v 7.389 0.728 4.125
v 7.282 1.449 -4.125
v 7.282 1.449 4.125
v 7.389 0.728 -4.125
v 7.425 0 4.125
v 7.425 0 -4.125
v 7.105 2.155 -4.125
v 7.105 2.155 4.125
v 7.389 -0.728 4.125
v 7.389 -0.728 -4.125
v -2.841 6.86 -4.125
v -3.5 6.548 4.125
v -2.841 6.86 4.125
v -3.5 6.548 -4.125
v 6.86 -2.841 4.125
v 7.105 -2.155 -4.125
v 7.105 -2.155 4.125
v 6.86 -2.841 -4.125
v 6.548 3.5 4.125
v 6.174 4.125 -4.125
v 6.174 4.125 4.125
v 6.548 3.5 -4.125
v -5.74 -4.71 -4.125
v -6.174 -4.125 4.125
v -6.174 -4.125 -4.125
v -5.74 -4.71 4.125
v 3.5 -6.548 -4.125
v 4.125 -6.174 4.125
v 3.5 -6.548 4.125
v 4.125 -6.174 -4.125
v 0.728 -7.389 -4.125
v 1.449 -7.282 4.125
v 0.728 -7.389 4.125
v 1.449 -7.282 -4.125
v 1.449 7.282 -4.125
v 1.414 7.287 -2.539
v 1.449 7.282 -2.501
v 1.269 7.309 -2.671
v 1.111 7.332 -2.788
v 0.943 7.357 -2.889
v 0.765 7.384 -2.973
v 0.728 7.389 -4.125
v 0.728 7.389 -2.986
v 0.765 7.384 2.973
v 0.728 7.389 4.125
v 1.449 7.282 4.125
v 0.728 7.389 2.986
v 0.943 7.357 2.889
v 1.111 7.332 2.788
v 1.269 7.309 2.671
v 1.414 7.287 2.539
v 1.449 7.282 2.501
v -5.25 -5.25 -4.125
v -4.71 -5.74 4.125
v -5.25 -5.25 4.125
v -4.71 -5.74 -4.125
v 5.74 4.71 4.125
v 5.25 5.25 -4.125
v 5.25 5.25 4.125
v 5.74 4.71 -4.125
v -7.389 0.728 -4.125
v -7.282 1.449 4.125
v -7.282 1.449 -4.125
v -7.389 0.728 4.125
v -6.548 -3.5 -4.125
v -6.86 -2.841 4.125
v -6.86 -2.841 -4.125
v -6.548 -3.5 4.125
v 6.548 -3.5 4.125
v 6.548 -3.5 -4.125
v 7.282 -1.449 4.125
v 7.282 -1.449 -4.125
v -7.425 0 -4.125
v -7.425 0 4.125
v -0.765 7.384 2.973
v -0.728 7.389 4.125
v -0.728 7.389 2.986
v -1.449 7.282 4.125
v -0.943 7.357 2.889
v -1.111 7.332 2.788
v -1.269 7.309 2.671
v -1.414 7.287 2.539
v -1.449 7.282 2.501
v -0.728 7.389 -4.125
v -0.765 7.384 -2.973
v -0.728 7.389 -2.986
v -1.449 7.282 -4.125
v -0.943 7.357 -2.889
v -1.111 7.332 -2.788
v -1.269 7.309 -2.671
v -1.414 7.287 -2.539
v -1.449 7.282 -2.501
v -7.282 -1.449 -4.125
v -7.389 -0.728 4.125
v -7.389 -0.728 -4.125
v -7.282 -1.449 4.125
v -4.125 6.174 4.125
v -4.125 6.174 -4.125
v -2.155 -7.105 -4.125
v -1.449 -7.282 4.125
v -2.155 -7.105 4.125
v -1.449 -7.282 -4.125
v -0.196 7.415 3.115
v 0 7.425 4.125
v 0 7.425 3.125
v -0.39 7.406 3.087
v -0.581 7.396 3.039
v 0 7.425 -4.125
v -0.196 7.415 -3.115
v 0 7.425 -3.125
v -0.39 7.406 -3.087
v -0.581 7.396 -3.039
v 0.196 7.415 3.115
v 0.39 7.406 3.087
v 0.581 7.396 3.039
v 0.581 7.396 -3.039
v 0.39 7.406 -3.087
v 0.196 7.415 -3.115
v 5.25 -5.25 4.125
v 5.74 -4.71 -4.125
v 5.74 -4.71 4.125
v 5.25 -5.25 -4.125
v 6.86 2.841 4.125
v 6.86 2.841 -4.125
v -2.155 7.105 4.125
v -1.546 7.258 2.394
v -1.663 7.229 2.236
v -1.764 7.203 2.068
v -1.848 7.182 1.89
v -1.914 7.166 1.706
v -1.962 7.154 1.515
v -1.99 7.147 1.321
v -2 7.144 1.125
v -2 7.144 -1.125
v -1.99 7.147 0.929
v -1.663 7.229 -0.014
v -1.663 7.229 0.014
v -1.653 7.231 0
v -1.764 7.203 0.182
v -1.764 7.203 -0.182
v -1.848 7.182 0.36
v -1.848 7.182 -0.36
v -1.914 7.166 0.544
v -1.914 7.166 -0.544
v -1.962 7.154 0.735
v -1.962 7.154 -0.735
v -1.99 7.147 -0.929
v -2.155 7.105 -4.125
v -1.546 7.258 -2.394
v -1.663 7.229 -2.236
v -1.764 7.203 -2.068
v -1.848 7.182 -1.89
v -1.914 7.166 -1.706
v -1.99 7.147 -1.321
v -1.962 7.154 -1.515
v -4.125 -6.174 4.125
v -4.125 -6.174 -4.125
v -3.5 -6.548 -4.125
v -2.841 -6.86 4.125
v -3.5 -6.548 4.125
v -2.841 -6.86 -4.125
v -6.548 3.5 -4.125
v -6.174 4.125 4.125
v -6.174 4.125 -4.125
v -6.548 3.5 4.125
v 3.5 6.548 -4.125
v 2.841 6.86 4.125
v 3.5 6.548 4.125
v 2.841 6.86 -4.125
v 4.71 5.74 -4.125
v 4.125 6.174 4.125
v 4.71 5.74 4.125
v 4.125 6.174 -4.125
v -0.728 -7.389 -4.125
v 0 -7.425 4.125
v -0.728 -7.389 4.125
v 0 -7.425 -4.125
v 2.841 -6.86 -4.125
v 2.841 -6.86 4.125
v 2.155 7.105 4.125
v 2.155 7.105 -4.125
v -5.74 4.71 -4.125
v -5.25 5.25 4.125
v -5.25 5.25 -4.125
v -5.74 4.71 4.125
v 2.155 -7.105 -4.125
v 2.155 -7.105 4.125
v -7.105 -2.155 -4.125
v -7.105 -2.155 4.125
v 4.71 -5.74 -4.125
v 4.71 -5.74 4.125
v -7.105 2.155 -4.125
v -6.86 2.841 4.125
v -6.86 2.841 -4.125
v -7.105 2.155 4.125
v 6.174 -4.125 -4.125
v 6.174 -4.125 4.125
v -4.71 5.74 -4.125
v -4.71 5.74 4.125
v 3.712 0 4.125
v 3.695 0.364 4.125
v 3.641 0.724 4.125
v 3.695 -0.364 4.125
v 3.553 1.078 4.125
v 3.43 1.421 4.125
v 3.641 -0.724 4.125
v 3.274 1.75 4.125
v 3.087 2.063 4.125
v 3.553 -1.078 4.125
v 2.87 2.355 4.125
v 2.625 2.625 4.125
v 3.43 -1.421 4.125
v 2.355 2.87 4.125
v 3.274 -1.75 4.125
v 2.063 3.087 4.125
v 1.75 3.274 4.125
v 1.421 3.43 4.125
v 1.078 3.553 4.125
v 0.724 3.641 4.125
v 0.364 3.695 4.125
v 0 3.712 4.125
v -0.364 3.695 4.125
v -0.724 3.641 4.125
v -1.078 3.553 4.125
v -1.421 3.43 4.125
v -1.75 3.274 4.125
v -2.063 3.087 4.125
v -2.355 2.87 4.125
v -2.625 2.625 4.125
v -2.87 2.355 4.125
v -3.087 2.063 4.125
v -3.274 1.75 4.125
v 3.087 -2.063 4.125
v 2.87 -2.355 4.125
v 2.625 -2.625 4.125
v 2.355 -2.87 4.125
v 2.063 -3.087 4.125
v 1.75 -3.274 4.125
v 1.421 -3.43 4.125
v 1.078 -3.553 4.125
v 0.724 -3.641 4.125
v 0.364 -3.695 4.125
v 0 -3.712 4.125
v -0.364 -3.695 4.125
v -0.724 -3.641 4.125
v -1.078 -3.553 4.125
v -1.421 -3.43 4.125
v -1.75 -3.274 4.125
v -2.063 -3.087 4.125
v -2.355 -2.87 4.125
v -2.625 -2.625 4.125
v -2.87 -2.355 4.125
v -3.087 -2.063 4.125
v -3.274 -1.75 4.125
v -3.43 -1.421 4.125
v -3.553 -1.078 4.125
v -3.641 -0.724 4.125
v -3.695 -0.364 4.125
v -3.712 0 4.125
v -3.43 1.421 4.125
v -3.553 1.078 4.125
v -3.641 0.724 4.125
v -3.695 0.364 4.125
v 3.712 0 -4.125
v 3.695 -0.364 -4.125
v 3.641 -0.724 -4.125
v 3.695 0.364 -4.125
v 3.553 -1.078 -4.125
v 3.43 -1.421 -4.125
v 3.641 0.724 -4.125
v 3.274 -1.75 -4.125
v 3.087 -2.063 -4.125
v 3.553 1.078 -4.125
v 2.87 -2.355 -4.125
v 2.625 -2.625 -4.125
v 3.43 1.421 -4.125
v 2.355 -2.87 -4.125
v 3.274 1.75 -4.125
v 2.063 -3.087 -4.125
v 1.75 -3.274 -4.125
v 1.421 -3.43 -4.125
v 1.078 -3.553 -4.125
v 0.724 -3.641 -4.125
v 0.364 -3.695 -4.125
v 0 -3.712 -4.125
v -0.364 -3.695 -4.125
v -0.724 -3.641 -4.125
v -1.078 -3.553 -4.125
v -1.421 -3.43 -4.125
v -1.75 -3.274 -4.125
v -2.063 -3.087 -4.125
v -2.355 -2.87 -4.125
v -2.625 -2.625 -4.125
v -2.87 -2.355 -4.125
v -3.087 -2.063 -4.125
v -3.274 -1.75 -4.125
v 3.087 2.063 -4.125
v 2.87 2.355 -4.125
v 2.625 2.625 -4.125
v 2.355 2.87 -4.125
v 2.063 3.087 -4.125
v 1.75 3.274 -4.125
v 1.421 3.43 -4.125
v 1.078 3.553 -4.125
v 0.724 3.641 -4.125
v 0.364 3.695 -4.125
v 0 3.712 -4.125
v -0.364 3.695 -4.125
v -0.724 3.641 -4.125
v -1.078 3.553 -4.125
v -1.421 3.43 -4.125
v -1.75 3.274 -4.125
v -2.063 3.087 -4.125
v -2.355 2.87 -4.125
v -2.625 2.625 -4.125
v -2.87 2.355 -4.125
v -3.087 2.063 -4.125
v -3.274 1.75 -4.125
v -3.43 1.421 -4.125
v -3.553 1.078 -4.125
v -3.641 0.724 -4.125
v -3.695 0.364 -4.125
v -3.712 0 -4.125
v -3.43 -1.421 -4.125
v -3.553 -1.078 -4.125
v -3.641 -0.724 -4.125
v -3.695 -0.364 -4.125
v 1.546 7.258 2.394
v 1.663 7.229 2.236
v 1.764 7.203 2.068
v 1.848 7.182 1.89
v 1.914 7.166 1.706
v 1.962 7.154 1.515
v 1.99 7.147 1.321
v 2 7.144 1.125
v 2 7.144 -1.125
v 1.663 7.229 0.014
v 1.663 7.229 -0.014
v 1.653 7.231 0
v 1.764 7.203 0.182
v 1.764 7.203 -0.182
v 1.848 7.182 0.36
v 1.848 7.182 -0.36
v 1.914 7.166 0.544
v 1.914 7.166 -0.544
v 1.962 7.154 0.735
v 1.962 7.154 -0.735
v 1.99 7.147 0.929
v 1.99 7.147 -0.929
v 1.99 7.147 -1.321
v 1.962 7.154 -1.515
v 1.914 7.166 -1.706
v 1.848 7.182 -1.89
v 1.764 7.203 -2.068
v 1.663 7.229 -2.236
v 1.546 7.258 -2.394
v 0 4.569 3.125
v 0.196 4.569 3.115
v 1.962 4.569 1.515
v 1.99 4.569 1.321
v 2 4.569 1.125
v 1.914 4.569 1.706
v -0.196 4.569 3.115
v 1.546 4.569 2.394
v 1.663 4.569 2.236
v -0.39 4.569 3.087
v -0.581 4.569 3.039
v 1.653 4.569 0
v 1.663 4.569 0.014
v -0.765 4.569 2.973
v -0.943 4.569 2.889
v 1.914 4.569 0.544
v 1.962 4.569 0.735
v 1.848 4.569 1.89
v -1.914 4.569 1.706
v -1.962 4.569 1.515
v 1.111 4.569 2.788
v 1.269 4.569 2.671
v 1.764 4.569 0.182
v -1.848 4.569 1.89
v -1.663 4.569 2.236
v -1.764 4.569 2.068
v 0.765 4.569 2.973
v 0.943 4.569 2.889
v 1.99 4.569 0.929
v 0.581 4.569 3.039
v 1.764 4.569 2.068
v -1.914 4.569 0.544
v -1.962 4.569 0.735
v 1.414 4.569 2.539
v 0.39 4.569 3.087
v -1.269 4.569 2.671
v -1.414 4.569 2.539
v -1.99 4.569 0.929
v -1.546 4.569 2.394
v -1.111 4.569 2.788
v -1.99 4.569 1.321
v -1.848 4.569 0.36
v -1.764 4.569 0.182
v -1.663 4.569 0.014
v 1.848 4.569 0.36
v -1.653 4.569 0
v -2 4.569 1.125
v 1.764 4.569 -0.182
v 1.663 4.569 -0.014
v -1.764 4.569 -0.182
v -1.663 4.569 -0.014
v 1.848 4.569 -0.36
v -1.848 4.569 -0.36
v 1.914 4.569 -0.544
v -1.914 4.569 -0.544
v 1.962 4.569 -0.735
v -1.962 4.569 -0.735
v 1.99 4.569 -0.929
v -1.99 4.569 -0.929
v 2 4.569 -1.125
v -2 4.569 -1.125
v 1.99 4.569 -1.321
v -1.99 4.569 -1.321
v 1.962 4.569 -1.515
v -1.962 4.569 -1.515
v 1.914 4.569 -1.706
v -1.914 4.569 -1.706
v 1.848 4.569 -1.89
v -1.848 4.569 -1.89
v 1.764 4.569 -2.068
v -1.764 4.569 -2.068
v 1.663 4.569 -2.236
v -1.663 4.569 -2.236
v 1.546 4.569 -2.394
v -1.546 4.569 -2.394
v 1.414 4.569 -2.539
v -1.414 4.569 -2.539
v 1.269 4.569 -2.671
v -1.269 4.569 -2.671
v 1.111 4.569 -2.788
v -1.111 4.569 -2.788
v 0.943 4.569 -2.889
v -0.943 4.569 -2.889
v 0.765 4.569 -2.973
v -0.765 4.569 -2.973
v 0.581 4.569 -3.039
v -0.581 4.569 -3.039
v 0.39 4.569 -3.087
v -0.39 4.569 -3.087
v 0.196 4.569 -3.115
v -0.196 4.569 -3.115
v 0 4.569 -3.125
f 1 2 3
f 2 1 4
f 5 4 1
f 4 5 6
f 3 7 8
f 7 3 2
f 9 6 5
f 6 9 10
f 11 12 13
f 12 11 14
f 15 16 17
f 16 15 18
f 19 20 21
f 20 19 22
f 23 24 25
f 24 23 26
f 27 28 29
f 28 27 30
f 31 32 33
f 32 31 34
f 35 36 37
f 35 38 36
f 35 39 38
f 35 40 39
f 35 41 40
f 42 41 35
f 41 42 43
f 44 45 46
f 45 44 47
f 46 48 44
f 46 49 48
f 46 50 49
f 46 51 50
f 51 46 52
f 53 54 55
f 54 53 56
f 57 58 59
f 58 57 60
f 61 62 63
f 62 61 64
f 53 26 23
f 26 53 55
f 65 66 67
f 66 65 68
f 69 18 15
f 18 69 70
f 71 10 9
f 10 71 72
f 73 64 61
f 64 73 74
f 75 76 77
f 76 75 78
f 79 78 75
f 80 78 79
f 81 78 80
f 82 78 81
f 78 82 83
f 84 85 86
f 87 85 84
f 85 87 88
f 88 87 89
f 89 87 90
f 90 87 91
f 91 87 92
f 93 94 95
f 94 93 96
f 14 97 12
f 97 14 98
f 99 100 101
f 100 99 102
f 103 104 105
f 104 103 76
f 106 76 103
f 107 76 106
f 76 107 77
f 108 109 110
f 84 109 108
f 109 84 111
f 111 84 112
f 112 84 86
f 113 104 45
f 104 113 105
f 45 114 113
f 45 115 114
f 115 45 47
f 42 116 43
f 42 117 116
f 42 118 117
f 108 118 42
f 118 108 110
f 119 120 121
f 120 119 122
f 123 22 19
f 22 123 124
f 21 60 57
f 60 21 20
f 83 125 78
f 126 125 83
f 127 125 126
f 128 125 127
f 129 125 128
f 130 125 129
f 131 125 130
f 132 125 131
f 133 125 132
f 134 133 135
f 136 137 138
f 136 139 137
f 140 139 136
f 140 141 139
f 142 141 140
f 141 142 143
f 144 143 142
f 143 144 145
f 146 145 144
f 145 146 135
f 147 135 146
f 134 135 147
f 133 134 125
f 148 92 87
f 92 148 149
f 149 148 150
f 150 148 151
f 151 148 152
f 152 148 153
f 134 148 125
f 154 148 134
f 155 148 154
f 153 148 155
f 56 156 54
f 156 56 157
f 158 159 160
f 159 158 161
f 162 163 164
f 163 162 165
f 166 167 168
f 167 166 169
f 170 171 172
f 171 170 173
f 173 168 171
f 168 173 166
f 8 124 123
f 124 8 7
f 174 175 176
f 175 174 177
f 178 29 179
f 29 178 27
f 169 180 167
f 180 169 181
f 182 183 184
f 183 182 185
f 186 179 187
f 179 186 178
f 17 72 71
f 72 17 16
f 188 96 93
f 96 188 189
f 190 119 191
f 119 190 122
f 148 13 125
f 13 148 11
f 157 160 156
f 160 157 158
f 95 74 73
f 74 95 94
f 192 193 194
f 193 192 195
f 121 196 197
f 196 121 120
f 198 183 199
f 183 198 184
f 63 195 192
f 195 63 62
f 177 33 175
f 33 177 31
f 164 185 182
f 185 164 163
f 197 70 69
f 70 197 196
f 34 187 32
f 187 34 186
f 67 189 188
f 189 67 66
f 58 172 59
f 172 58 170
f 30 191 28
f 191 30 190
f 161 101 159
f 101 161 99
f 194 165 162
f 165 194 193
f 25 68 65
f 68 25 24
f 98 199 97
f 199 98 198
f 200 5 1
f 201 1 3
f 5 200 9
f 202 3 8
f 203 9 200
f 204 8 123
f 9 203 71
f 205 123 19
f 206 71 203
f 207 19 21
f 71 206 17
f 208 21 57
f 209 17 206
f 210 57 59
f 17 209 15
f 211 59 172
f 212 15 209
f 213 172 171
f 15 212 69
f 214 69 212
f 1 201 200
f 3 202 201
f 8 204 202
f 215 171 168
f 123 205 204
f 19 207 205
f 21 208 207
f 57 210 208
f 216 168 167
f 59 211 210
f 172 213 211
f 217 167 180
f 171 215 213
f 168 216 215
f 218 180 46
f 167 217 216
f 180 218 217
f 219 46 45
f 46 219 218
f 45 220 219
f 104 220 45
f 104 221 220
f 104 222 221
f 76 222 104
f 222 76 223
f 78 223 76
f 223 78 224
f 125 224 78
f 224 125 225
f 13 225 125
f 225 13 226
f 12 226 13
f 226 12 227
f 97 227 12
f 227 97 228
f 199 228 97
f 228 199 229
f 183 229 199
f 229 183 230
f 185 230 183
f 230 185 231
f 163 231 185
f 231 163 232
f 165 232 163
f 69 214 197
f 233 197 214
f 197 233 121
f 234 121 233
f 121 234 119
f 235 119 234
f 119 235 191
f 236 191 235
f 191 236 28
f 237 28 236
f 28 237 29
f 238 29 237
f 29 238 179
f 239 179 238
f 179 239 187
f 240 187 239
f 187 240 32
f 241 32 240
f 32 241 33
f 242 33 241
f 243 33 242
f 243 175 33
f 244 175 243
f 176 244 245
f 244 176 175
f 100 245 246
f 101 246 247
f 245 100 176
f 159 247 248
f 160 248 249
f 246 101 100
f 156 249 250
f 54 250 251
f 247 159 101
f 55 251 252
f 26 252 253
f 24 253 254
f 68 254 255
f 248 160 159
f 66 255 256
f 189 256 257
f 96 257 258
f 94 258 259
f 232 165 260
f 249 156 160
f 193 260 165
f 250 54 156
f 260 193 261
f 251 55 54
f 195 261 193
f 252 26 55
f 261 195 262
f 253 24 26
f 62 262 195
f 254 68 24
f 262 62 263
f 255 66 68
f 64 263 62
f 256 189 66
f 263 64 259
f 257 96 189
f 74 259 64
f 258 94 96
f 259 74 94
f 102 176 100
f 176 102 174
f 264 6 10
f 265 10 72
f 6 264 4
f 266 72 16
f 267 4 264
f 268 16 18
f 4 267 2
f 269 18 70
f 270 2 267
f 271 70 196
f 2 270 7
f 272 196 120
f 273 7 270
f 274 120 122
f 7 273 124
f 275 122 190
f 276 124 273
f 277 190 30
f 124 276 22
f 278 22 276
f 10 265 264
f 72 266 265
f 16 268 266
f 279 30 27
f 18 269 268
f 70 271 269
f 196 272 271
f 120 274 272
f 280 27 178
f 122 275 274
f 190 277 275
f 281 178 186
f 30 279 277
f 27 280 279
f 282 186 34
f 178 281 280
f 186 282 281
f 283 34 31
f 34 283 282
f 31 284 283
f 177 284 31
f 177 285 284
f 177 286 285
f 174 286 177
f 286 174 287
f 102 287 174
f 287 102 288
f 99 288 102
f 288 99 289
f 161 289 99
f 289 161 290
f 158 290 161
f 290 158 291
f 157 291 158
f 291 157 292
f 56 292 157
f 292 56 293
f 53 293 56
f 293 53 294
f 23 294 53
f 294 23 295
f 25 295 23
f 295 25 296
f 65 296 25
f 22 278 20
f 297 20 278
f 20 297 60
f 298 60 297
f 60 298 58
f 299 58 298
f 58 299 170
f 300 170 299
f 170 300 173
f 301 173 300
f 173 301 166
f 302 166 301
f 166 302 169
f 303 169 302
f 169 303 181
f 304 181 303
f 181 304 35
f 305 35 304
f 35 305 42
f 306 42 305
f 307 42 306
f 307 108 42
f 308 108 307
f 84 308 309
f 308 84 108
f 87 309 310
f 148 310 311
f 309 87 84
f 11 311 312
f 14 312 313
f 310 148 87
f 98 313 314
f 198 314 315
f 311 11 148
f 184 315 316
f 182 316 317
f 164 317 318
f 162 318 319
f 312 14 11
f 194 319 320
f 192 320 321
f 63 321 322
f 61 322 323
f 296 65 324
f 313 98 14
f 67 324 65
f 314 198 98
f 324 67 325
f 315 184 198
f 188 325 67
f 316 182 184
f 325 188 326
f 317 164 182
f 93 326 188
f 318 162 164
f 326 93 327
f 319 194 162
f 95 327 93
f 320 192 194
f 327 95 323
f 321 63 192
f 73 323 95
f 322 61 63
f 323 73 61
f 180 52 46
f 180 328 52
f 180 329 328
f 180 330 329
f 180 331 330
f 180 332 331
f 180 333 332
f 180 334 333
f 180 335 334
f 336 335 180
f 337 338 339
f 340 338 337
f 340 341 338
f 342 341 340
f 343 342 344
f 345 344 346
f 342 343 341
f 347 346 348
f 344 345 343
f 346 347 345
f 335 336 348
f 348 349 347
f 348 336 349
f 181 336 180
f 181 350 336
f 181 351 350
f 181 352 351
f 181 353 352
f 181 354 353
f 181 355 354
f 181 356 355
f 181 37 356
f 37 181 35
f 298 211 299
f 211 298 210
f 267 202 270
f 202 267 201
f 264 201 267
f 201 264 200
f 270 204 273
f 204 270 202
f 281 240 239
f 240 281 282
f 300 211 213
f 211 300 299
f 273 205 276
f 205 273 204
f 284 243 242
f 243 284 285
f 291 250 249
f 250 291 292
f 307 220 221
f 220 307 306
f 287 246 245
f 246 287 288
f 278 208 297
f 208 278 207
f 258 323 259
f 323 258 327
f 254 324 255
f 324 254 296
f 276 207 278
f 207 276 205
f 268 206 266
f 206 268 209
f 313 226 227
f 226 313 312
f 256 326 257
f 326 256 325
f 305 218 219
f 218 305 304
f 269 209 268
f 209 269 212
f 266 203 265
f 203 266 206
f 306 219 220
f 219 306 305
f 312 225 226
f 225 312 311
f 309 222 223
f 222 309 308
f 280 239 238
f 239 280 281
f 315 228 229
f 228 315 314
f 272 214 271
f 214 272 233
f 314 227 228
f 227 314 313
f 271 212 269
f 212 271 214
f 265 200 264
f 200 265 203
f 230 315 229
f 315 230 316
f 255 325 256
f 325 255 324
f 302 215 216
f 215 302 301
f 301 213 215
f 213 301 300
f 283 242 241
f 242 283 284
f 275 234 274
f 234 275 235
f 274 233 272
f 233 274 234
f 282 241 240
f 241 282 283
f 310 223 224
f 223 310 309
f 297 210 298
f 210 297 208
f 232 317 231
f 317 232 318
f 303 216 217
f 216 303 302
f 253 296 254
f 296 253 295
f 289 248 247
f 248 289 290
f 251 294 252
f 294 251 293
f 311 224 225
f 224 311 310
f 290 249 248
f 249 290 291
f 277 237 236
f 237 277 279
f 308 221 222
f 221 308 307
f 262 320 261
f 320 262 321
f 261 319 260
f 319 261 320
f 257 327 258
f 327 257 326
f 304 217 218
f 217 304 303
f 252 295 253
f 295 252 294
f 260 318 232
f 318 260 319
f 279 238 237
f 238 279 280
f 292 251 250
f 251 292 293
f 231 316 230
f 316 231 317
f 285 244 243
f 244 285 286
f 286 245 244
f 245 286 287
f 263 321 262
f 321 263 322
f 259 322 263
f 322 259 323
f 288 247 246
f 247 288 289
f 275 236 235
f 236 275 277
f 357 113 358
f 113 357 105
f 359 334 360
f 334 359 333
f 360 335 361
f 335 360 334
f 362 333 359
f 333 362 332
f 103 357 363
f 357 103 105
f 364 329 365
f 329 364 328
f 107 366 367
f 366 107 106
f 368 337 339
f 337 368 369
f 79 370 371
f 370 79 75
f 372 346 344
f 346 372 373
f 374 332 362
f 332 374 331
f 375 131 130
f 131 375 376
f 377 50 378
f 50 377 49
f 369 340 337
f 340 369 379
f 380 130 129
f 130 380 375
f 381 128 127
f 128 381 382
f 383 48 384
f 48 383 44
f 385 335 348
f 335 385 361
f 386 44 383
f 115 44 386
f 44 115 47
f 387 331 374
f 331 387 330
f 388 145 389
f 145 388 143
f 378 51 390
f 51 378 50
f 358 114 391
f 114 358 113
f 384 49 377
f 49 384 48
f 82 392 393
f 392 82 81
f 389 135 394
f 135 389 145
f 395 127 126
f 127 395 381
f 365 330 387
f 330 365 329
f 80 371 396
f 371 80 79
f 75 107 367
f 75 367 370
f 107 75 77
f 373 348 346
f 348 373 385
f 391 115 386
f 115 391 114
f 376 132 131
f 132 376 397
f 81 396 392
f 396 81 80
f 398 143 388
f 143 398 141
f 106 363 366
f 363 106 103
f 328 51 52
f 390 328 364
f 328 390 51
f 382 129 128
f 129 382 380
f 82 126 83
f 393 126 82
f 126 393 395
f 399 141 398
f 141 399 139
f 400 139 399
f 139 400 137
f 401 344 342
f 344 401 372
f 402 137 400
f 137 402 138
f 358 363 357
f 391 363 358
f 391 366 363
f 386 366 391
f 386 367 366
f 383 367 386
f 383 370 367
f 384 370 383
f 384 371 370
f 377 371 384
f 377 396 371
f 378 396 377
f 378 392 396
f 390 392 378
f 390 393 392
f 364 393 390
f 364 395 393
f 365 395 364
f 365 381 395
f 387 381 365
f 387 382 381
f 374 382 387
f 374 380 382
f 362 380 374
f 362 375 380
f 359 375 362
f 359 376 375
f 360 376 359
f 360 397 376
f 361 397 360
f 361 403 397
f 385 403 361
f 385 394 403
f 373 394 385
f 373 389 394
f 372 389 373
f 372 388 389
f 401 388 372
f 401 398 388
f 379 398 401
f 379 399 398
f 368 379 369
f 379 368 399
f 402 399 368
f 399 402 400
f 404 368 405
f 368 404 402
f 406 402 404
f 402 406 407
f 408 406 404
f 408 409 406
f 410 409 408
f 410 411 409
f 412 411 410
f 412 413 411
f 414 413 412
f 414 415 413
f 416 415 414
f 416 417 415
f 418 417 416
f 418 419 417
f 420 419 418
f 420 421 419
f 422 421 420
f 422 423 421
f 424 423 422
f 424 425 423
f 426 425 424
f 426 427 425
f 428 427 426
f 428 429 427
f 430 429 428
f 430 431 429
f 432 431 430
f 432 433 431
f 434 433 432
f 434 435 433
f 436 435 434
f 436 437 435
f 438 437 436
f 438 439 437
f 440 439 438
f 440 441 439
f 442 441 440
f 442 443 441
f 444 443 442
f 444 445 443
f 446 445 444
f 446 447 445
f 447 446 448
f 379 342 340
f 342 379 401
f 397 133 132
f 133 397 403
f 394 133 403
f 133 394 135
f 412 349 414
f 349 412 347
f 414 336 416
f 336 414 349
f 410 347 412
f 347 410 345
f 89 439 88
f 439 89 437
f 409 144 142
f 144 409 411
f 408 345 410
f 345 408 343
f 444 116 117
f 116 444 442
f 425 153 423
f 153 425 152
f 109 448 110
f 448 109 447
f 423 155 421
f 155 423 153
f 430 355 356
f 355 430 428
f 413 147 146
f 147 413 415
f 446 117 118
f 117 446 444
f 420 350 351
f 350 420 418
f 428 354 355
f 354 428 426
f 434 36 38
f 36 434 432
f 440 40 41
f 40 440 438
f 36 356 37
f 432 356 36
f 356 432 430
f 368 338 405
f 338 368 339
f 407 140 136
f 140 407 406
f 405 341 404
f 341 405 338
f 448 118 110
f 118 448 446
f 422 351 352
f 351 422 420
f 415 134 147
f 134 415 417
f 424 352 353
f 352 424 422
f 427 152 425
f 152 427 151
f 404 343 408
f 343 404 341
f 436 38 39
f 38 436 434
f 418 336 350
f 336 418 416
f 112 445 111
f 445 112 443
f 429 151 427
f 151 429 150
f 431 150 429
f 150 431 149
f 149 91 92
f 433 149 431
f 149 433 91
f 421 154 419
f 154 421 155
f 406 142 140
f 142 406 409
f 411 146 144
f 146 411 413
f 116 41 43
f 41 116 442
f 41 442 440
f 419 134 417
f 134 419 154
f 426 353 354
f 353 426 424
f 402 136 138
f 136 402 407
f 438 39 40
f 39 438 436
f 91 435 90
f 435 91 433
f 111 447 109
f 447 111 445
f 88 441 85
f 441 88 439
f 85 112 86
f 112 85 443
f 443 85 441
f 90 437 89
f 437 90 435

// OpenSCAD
// COBRA Vertebra - L3 V21
// Height: 8.25mm, OD: 14.850000000000001mm

$fn = 64;

difference() {
    // Outer cylinder
    cylinder(h=8.25, d=14.850000000000001, center=true);
    
    // Inner channel
    cylinder(h=10.25, d=7.425000000000001, center=true);

    // Pivot holes
    translate([0, 7.425000000000001, 1.125])
    rotate([90, 0, 0])
    cylinder(h=5.7125, d=4, center=true);
    
    translate([0, 7.425000000000001, -1.125])
    rotate([90, 0, 0])
    cylinder(h=5.7125, d=4, center=true);
}
